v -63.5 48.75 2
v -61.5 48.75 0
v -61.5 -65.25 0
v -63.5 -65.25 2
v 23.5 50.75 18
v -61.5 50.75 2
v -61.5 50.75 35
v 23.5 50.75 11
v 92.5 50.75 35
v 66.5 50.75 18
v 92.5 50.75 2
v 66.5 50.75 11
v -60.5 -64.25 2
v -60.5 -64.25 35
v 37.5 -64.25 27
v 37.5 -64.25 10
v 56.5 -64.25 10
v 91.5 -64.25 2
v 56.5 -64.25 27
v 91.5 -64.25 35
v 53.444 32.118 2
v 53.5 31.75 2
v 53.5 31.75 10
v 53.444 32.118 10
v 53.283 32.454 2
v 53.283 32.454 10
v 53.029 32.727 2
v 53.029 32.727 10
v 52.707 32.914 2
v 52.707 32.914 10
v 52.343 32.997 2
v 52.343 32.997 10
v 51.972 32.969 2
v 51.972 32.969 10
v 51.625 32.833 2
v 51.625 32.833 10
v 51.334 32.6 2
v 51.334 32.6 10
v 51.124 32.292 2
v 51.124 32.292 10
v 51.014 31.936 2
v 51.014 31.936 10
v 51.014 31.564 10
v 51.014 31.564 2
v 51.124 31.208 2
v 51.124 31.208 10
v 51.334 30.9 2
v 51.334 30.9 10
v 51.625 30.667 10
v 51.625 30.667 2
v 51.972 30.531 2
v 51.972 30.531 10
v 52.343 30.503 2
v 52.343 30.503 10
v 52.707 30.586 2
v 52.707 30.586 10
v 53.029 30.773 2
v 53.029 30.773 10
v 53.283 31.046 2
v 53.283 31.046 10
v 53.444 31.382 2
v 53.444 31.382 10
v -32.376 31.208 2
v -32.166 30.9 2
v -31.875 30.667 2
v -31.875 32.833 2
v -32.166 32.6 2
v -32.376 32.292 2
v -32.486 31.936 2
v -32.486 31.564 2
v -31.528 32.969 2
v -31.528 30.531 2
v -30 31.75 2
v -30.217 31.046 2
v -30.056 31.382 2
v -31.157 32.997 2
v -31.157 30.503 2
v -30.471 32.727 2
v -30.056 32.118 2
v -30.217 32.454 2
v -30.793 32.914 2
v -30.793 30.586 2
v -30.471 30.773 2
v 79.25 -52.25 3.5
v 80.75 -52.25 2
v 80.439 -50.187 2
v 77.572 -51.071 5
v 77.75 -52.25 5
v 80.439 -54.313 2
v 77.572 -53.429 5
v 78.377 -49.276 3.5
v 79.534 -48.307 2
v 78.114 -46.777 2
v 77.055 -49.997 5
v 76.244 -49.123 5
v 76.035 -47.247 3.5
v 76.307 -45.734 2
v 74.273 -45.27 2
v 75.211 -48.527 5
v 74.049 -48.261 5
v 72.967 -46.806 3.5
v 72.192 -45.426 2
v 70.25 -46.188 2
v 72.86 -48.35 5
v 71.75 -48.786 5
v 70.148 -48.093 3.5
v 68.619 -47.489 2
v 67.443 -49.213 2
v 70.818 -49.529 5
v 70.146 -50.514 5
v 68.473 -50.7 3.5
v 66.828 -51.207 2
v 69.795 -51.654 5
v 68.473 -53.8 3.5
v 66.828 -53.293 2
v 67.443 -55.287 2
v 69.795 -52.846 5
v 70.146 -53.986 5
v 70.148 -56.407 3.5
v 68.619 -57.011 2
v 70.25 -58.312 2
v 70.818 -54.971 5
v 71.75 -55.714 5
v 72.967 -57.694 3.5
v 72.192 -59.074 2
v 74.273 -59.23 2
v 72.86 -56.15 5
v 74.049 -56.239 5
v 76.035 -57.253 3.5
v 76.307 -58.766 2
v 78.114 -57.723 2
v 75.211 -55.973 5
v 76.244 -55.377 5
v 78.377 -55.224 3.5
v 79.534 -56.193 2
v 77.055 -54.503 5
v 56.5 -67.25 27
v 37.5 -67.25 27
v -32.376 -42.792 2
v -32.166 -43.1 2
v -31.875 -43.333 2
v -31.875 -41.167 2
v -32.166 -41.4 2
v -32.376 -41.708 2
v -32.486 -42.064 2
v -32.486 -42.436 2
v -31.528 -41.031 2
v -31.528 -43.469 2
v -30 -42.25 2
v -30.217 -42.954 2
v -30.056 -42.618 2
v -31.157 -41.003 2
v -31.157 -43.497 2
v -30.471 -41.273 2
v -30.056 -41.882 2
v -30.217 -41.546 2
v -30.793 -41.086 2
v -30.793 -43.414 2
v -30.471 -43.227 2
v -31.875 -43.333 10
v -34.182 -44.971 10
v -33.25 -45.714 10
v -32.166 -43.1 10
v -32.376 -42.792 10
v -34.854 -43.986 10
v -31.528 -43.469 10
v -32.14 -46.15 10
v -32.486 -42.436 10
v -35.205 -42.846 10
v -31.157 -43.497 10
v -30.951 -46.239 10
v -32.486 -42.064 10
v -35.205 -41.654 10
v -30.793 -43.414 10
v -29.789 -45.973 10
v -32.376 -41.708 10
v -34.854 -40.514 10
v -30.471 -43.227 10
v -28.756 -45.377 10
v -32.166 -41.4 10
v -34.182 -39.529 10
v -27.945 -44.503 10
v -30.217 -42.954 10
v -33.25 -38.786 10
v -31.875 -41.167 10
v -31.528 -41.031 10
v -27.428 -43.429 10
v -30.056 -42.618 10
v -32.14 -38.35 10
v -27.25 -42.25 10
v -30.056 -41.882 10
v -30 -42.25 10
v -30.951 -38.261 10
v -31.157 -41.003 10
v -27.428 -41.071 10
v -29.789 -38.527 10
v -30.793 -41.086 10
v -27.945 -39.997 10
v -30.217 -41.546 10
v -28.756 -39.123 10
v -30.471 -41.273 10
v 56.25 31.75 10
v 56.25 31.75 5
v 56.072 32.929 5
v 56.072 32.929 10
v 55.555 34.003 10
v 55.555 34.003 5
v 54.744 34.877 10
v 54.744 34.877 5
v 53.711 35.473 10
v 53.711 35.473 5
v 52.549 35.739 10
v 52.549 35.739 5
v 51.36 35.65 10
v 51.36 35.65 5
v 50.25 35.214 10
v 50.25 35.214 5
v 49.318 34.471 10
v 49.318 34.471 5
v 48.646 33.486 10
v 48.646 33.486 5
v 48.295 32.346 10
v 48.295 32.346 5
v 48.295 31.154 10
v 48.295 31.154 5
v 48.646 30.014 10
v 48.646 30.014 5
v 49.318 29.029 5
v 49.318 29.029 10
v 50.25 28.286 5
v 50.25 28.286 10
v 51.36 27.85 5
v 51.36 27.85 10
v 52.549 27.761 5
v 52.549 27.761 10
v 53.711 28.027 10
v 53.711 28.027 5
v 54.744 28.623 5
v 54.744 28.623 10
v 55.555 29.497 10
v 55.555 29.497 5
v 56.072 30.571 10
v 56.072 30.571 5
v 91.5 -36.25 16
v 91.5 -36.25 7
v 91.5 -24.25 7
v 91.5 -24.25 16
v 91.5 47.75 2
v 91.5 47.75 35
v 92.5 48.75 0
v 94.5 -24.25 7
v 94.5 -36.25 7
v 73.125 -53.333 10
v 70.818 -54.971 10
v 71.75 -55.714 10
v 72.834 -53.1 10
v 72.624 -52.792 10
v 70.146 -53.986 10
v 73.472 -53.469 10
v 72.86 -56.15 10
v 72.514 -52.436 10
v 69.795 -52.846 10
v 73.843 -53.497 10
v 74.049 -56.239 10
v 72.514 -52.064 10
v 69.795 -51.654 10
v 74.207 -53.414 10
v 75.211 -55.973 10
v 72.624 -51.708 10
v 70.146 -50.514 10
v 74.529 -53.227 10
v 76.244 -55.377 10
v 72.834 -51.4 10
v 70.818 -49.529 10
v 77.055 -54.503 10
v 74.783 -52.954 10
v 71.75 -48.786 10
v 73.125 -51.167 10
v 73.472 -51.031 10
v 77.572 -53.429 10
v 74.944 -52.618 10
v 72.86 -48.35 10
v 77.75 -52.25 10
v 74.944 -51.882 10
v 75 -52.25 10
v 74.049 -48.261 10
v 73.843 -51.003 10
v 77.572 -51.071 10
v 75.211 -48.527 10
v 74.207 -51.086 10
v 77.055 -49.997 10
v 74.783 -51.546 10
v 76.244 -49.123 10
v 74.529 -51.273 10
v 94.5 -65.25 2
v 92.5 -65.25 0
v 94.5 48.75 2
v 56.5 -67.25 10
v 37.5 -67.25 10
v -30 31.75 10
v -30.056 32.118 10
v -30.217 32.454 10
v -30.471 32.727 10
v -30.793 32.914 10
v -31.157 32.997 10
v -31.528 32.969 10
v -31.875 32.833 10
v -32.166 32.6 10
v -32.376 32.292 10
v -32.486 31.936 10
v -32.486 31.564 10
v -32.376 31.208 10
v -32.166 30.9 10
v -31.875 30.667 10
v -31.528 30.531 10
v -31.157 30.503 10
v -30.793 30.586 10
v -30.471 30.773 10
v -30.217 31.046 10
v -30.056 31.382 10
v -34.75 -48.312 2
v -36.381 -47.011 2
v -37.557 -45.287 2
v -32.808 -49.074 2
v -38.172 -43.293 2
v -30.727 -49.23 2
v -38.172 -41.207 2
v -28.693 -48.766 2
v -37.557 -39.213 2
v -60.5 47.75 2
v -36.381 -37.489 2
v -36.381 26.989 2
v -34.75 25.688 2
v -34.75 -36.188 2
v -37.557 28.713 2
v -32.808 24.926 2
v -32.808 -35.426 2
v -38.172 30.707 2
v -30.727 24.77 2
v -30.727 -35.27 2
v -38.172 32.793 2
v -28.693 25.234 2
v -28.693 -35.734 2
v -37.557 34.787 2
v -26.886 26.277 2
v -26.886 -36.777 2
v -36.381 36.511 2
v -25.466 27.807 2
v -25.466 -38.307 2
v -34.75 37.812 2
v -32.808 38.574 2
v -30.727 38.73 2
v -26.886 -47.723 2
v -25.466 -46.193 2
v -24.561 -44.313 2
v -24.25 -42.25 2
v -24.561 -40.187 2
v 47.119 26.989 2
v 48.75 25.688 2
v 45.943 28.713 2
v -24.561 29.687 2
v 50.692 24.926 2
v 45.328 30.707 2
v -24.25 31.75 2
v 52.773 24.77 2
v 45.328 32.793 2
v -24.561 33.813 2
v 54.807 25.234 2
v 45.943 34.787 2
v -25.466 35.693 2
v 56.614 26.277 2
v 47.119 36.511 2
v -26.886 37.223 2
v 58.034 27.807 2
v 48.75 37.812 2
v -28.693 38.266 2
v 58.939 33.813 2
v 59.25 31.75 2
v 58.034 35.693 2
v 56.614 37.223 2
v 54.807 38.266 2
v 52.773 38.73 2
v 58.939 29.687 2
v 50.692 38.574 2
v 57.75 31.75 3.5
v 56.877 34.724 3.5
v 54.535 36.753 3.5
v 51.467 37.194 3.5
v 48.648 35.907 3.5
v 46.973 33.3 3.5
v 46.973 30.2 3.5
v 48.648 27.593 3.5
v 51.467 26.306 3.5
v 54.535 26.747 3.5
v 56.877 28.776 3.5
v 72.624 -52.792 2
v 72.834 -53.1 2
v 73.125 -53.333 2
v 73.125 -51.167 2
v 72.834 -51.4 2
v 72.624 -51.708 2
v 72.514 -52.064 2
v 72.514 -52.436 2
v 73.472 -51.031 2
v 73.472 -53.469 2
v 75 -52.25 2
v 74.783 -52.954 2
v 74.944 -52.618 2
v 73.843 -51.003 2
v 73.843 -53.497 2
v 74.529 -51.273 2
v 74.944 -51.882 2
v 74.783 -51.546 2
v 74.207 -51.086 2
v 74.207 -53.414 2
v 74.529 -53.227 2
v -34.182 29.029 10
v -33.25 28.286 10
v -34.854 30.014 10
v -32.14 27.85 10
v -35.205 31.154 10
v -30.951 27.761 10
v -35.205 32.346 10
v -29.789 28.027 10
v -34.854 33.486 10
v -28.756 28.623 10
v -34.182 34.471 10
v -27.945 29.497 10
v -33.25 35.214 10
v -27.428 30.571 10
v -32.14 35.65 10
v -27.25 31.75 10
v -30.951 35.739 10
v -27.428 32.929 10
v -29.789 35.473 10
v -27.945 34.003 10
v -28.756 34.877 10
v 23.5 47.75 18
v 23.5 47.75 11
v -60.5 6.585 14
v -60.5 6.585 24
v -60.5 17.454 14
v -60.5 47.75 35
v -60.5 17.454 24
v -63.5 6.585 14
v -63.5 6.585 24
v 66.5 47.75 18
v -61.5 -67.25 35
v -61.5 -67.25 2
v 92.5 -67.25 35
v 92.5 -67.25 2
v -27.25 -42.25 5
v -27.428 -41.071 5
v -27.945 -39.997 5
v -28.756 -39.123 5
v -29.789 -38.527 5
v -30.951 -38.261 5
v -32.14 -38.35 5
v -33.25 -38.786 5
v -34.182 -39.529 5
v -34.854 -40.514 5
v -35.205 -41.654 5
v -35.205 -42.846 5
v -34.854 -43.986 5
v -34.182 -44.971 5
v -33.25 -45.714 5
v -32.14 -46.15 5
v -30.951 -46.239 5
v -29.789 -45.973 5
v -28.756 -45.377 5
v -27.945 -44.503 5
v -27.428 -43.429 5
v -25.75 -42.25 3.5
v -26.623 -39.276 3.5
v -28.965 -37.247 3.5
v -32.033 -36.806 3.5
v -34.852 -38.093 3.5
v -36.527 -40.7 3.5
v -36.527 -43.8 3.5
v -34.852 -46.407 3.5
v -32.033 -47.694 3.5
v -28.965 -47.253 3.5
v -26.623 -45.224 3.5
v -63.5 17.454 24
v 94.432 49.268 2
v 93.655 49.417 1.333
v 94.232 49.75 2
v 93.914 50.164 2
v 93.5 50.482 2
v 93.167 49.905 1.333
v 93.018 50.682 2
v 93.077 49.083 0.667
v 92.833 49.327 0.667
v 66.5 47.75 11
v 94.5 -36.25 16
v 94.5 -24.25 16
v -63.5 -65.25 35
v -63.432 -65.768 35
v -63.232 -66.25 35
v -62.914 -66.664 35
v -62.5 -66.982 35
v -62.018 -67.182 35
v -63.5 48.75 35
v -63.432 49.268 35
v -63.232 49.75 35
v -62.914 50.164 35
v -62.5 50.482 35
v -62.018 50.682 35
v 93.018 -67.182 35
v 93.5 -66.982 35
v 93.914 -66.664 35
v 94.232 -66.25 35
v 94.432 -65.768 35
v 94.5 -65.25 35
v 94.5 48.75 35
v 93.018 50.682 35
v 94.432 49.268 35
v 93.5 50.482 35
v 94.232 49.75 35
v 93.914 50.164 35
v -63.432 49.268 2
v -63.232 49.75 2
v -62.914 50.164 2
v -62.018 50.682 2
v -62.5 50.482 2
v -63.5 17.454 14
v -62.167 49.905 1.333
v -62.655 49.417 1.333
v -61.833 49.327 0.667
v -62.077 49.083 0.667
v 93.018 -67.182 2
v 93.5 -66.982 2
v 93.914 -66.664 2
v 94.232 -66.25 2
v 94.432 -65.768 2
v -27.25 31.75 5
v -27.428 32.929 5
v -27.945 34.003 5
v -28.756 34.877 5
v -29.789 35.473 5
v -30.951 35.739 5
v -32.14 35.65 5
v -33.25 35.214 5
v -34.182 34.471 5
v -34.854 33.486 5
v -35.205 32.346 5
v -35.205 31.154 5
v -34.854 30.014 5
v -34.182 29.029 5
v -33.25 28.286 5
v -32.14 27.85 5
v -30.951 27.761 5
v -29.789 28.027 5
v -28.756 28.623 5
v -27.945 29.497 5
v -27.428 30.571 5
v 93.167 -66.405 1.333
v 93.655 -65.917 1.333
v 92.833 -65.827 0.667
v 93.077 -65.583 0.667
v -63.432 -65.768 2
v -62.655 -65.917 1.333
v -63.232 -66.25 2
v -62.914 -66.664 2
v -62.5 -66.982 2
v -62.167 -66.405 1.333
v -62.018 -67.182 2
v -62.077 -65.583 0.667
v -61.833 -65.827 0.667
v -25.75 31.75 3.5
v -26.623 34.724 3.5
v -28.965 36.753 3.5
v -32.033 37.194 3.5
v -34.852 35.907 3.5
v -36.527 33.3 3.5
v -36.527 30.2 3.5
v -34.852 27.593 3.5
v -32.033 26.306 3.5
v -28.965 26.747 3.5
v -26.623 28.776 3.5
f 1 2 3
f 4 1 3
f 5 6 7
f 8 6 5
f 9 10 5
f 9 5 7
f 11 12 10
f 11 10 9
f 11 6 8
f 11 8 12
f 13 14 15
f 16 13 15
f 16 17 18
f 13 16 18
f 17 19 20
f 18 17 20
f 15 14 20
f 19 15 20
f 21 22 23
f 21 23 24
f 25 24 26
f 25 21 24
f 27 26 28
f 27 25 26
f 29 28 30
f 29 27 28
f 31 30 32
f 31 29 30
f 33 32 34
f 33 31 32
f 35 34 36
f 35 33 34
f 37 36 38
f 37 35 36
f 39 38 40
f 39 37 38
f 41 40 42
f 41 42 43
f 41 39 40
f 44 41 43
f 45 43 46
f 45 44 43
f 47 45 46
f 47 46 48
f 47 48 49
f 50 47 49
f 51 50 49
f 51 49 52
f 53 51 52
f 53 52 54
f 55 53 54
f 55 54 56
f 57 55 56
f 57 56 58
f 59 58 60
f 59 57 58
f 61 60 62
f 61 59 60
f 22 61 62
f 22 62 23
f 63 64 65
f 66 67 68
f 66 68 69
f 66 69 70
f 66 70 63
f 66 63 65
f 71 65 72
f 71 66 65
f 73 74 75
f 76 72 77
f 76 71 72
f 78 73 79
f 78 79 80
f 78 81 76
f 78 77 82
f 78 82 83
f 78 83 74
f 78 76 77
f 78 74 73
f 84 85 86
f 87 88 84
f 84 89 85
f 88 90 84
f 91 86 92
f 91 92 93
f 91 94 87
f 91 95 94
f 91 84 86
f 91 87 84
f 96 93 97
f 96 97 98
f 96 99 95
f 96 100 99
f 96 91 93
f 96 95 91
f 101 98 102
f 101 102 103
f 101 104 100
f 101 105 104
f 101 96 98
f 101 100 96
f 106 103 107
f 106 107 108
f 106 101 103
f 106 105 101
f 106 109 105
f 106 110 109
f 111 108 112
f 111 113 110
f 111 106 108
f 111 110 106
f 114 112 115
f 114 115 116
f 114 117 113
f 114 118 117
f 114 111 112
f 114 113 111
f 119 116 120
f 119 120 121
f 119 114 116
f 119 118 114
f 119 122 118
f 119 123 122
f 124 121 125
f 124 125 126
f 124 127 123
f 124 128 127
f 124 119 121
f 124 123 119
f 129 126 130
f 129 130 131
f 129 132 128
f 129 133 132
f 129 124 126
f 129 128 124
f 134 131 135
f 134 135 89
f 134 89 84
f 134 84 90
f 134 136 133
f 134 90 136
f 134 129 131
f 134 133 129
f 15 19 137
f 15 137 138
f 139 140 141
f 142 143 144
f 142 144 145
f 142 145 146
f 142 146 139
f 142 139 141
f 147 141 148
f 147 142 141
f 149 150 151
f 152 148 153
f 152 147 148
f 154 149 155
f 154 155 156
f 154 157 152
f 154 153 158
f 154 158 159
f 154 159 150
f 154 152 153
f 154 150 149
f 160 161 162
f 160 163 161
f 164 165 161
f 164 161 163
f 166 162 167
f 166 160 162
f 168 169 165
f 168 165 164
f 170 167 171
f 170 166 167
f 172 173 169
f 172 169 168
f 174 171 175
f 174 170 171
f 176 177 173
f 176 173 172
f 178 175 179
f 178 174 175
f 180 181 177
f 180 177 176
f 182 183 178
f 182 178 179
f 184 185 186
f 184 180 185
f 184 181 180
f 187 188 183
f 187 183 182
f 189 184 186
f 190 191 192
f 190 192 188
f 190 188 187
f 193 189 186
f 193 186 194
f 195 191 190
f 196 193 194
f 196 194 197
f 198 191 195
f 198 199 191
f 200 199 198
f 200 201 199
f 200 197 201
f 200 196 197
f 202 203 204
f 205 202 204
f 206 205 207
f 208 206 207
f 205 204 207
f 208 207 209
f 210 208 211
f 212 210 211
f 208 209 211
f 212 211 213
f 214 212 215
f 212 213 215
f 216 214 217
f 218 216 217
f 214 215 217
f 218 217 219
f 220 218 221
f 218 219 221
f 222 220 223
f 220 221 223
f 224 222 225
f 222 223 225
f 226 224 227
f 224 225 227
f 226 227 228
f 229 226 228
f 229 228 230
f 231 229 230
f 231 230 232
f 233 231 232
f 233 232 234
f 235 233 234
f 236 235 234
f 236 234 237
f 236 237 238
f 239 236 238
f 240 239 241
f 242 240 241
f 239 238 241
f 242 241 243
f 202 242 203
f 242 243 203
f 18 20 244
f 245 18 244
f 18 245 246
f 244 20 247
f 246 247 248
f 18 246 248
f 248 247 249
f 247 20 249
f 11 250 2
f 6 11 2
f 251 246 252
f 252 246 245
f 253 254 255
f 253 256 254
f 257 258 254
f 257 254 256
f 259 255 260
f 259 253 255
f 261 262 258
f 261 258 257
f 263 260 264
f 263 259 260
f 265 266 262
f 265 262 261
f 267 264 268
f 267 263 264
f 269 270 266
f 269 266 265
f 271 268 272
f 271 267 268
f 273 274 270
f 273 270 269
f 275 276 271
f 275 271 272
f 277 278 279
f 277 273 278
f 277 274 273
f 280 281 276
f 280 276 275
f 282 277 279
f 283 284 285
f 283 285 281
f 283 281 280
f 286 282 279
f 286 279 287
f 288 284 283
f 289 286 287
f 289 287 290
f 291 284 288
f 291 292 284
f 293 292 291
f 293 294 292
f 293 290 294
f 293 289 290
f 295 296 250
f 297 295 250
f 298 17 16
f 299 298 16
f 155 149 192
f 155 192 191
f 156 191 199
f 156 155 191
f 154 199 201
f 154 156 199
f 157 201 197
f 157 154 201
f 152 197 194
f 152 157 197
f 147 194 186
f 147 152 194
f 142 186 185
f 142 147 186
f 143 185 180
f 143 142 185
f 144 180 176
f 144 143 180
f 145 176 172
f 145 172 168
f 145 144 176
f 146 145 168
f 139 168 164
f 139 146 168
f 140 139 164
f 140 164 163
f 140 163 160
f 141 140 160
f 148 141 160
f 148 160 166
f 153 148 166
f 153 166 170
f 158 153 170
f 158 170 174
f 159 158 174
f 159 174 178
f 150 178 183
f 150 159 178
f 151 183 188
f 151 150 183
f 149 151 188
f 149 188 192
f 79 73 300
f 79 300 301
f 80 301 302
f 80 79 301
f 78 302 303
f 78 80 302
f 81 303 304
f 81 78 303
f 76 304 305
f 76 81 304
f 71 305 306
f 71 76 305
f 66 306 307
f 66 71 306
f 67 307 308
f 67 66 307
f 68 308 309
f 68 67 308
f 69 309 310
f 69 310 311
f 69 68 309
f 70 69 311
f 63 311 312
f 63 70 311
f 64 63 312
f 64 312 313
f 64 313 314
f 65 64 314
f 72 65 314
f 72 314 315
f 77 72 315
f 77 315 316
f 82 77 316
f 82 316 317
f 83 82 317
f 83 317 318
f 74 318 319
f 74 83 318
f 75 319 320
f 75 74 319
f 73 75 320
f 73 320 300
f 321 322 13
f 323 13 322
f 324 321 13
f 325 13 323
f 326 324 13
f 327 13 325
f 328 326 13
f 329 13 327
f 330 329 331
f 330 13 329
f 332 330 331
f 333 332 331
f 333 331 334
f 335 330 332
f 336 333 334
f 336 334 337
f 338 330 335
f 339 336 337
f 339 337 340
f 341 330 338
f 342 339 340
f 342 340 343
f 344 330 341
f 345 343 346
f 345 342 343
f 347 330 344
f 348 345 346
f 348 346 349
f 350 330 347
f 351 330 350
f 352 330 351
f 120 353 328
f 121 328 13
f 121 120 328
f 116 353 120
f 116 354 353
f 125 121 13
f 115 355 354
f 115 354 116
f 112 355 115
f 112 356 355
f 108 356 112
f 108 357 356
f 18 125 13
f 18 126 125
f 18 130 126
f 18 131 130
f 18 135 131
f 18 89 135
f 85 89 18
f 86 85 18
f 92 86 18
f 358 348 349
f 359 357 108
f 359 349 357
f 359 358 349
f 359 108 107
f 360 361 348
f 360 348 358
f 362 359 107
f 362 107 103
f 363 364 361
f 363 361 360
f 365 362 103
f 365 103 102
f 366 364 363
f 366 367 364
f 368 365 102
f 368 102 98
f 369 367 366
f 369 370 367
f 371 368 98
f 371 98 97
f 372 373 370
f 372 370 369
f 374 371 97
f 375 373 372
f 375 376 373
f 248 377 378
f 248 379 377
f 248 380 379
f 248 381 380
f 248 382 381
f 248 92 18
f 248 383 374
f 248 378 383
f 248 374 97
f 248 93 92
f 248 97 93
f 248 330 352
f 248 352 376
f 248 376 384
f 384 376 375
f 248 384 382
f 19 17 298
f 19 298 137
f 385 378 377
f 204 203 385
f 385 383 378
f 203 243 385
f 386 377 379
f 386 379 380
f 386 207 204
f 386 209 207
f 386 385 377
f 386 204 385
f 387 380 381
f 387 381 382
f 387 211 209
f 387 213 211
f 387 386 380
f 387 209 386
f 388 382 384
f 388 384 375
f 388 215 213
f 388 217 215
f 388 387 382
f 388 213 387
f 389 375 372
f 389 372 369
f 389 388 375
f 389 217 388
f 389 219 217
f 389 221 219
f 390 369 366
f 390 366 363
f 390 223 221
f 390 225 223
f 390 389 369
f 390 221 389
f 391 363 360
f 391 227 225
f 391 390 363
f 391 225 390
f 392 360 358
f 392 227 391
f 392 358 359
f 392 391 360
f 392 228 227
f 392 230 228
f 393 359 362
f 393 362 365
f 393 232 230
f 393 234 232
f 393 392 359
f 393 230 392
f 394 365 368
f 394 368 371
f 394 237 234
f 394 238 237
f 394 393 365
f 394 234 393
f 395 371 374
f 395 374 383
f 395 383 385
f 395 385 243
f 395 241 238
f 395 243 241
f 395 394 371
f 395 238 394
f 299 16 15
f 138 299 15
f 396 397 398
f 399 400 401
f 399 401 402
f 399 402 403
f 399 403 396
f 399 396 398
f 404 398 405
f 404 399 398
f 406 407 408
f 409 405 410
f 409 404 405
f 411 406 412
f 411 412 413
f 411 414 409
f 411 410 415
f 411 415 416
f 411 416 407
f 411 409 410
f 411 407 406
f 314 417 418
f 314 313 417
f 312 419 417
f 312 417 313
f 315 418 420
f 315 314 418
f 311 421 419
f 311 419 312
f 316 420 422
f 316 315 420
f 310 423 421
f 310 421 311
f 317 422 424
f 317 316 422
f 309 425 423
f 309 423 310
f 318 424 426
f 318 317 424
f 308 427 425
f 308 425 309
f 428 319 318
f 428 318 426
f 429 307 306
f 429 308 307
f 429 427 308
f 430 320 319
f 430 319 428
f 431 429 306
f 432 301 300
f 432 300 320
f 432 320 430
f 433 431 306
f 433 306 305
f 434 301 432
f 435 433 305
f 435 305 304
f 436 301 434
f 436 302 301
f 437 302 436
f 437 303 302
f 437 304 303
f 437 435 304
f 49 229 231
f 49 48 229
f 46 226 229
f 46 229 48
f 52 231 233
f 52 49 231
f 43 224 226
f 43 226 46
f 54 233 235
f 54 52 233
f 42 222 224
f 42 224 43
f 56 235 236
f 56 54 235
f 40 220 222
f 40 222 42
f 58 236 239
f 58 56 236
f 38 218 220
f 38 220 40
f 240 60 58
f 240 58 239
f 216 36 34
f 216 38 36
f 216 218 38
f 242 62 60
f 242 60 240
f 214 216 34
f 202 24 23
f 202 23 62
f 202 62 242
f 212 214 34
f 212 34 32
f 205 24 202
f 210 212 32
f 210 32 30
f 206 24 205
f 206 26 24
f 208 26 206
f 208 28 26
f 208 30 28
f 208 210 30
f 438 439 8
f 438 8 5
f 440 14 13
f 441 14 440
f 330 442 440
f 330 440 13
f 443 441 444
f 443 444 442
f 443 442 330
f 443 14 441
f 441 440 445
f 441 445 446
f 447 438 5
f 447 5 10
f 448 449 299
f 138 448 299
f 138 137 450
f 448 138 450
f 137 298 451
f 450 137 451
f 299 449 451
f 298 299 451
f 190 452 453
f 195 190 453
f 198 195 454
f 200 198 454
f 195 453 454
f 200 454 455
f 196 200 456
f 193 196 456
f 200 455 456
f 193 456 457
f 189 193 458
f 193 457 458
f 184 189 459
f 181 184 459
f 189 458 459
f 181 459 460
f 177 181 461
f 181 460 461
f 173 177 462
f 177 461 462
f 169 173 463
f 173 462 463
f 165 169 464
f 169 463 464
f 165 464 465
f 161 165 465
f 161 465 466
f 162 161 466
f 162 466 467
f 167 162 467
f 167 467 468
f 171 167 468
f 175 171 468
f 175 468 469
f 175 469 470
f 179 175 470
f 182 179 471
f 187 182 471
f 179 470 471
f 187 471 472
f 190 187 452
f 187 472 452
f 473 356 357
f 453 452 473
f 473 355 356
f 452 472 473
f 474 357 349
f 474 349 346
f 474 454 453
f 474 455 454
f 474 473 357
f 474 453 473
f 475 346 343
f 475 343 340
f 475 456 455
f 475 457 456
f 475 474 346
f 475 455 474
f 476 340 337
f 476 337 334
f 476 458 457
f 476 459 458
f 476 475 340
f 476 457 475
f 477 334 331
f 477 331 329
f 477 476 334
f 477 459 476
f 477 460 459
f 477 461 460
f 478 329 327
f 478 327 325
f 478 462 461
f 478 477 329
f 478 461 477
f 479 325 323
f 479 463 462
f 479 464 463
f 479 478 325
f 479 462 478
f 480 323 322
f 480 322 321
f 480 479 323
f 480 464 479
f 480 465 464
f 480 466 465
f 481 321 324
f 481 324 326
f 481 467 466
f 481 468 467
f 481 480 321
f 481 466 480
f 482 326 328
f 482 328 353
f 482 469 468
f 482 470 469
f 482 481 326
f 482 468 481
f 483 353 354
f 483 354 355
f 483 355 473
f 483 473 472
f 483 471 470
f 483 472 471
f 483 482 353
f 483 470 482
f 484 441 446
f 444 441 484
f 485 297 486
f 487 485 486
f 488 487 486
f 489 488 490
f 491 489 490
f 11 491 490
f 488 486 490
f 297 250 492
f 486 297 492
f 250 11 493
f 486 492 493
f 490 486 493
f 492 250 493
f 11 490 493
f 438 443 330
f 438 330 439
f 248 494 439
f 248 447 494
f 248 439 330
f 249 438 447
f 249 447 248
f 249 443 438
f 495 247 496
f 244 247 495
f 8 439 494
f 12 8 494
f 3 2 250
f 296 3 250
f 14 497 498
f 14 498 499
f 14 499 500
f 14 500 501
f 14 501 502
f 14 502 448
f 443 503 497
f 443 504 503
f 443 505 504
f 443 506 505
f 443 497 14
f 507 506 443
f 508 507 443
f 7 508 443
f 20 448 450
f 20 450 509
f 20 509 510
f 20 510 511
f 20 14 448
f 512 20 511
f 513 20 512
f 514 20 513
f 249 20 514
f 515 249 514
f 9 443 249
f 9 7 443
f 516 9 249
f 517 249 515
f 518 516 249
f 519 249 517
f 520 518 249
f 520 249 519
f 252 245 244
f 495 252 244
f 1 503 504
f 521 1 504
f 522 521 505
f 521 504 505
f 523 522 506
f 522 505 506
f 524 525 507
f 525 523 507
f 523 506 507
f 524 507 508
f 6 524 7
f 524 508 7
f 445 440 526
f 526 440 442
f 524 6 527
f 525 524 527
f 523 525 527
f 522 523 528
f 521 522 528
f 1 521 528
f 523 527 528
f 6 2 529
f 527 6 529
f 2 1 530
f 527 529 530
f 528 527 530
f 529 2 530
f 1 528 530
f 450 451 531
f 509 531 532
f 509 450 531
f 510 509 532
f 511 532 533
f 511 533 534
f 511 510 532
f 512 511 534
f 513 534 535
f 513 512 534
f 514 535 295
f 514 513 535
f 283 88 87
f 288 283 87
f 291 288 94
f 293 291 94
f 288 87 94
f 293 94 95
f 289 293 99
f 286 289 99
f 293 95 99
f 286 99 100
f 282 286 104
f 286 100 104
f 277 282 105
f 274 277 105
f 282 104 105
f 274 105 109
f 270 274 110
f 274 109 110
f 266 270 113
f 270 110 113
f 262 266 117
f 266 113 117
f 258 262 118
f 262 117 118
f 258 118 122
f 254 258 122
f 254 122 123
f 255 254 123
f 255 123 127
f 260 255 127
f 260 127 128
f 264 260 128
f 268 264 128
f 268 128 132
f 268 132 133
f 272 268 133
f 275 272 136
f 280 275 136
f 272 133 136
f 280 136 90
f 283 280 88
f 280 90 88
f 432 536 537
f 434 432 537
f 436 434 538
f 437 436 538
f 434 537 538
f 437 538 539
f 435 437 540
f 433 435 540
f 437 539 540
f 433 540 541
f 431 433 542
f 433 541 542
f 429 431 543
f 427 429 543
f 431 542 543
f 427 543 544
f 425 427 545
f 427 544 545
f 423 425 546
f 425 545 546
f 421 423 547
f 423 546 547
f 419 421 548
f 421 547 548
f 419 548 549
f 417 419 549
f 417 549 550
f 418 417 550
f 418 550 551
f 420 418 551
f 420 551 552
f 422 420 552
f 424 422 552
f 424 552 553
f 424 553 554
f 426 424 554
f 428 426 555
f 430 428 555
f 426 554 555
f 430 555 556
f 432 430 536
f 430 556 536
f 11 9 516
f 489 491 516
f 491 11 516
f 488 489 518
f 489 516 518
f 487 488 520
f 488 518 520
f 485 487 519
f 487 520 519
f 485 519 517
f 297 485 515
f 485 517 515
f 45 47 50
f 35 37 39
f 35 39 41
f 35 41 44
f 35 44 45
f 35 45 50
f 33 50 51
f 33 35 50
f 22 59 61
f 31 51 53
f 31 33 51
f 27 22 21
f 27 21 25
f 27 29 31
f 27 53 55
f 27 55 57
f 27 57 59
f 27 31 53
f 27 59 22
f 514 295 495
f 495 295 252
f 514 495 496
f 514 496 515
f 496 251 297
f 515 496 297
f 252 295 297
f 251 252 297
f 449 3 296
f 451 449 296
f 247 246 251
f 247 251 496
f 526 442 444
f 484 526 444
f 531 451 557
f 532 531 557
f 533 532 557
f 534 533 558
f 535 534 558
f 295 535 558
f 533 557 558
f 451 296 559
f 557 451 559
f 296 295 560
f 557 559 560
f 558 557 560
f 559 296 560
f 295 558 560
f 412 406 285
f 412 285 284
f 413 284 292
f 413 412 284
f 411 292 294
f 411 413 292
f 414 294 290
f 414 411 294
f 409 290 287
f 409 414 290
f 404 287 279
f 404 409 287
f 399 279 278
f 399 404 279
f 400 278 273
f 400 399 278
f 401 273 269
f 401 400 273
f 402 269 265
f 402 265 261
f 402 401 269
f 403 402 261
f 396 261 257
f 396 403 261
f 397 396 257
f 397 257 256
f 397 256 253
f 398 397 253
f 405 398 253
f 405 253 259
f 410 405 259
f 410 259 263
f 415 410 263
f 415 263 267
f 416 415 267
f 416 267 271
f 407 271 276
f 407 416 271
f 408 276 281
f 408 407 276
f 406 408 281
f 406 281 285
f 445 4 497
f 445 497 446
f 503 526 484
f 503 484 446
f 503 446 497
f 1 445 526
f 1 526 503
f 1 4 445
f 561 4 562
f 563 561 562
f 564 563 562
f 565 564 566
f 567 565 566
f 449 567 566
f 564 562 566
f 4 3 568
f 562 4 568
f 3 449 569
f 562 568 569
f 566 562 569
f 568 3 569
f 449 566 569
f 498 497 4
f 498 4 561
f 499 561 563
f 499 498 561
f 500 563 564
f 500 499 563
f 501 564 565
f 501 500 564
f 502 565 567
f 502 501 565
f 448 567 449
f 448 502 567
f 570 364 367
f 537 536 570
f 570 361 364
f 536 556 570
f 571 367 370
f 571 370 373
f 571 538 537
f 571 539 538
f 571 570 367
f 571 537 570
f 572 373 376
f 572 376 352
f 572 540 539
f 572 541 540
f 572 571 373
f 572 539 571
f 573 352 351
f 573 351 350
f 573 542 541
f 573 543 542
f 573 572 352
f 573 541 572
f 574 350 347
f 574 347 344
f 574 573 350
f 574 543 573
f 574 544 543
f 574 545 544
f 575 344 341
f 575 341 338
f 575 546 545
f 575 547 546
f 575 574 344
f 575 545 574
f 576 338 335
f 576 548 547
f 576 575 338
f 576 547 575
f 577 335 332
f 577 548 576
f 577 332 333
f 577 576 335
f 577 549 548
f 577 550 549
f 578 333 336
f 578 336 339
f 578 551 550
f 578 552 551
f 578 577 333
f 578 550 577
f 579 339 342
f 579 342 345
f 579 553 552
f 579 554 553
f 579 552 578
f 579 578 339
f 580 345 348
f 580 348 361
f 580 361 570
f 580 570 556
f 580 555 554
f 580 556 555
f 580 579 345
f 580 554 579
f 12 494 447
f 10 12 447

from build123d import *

# Parameters (mm, degrees)
SKETCH010_W     = 158
SKETCH010_H     = 118
PAD003_DEPTH    = 35
SKETCH011_W     = 152
SKETCH011_H     = 112
POCKET006_DEPTH = 33
SKETCH012_R     = 4
SKETCH012_R_2   = 1.25
PAD004_DEPTH    = 8
CHAMFER_SIZE    = 3
SKETCH013_W     = 10.869108
SKETCH013_H     = 10
POCKET007_DEPTH = 3
SKETCH014_W     = 19
SKETCH014_H     = 17
POCKET008_DEPTH = 3.001
SKETCH015_W     = 43
SKETCH015_H     = 7
POCKET009_DEPTH = 3.001
FILLET_R        = 2
CHAMFER001_SIZE = 2
SKETCH019_W     = 12
SKETCH019_H     = 9
POCKET012_DEPTH = 3.001


with BuildPart() as part:
    # Sketch010 (on XY_Plane176 of Origin352) → Pad003 (new body)
    with BuildSketch(Plane.XY):
        with Locations((15.5, -8.25)):
            Rectangle(SKETCH010_W, SKETCH010_H)
    extrude(amount=PAD003_DEPTH)

    # Sketch011 (on Face6 of Pad003) → Pocket006 (cut)
    with BuildSketch(Plane.XY.offset(35)):
        with Locations((15.5, -8.25)):
            Rectangle(SKETCH011_W, SKETCH011_H)
    extrude(amount=-POCKET006_DEPTH, mode=Mode.SUBTRACT)

    # Sketch012 (on Face11 of Pocket006) → Pad004 (join)
    with BuildSketch(Plane.XY.offset(2)):
        with Locations((-31.25, 31.75)):
            Circle(SKETCH012_R)
        with Locations((-31.25, 31.75)):
            Circle(SKETCH012_R_2, mode=Mode.SUBTRACT)
        with Locations((52.25, 31.75)):
            Circle(SKETCH012_R)
        with Locations((52.25, 31.75)):
            Circle(SKETCH012_R_2, mode=Mode.SUBTRACT)
        with Locations((73.75, -52.25)):
            Circle(SKETCH012_R)
        with Locations((73.75, -52.25)):
            Circle(SKETCH012_R_2, mode=Mode.SUBTRACT)
        with Locations((-31.25, -42.25)):
            Circle(SKETCH012_R)
        with Locations((-31.25, -42.25)):
            Circle(SKETCH012_R_2, mode=Mode.SUBTRACT)
    extrude(amount=PAD004_DEPTH)

    # Chamfer
    chamfer_edges = [part.edges().sort_by_distance(p)[0] for p in [
        (48.25, 31.75, 2),
        (-35.25, 31.75, 2),
        (-35.25, -42.25, 2),
        (69.75, -52.25, 2),
    ]]
    chamfer(chamfer_edges, length=CHAMFER_SIZE)

    # Sketch013 (on Face3 of Chamfer) → Pocket007 (cut)
    with BuildSketch(Plane.YZ.offset(-60.5)):
        with Locations((12.019298, 19)):
            Rectangle(SKETCH013_W, SKETCH013_H)
    extrude(amount=-POCKET007_DEPTH, mode=Mode.SUBTRACT)

    # Sketch014 (on Face5 of Pocket007) → Pocket008 (cut, through all)
    with BuildSketch(Plane(origin=(0, -64.25, 0), x_dir=(-1, 0, 0), z_dir=(0, 1, 0))):
        with Locations((-47, 18.5)):
            Rectangle(SKETCH014_W, SKETCH014_H)
    extrude(amount=-POCKET008_DEPTH, mode=Mode.SUBTRACT)

    # Sketch015 (on Face4 of Pocket008) → Pocket009 (cut, through all)
    with BuildSketch(Plane.XZ.offset(-47.75)):
        with Locations((45, 14.5)):
            Rectangle(SKETCH015_W, SKETCH015_H)
    extrude(amount=-POCKET009_DEPTH, mode=Mode.SUBTRACT)

    # Fillet
    fillet_edges = [part.edges().sort_by_distance(p)[0] for p in [
        (94.5, -67.25, 17.5),
        (-63.5, -67.25, 17.5),
        (-63.5, 50.75, 17.5),
        (94.5, 50.75, 17.5),
    ]]
    fillet(fillet_edges, radius=FILLET_R)

    # Chamfer001
    chamfer001_edges = [part.edges().sort_by_distance(p)[0] for p in [
        (94.5, -8.25, 0),
        (15.5, 50.75, 0),
        (-63.5, -8.25, 0),
        (15.5, -67.25, 0),
    ]]
    chamfer(chamfer001_edges, length=CHAMFER001_SIZE)

    # Sketch019 (on Face20 of Chamfer001) → Pocket012 (cut, through all)
    with BuildSketch(Plane(origin=(91.5, 0, 0), x_dir=(0, -1, 0), z_dir=(-1, 0, 0))):
        with Locations((30.25, 11.5)):
            Rectangle(SKETCH019_W, SKETCH019_H)
    extrude(amount=-POCKET012_DEPTH, mode=Mode.SUBTRACT)


solid = part.part
